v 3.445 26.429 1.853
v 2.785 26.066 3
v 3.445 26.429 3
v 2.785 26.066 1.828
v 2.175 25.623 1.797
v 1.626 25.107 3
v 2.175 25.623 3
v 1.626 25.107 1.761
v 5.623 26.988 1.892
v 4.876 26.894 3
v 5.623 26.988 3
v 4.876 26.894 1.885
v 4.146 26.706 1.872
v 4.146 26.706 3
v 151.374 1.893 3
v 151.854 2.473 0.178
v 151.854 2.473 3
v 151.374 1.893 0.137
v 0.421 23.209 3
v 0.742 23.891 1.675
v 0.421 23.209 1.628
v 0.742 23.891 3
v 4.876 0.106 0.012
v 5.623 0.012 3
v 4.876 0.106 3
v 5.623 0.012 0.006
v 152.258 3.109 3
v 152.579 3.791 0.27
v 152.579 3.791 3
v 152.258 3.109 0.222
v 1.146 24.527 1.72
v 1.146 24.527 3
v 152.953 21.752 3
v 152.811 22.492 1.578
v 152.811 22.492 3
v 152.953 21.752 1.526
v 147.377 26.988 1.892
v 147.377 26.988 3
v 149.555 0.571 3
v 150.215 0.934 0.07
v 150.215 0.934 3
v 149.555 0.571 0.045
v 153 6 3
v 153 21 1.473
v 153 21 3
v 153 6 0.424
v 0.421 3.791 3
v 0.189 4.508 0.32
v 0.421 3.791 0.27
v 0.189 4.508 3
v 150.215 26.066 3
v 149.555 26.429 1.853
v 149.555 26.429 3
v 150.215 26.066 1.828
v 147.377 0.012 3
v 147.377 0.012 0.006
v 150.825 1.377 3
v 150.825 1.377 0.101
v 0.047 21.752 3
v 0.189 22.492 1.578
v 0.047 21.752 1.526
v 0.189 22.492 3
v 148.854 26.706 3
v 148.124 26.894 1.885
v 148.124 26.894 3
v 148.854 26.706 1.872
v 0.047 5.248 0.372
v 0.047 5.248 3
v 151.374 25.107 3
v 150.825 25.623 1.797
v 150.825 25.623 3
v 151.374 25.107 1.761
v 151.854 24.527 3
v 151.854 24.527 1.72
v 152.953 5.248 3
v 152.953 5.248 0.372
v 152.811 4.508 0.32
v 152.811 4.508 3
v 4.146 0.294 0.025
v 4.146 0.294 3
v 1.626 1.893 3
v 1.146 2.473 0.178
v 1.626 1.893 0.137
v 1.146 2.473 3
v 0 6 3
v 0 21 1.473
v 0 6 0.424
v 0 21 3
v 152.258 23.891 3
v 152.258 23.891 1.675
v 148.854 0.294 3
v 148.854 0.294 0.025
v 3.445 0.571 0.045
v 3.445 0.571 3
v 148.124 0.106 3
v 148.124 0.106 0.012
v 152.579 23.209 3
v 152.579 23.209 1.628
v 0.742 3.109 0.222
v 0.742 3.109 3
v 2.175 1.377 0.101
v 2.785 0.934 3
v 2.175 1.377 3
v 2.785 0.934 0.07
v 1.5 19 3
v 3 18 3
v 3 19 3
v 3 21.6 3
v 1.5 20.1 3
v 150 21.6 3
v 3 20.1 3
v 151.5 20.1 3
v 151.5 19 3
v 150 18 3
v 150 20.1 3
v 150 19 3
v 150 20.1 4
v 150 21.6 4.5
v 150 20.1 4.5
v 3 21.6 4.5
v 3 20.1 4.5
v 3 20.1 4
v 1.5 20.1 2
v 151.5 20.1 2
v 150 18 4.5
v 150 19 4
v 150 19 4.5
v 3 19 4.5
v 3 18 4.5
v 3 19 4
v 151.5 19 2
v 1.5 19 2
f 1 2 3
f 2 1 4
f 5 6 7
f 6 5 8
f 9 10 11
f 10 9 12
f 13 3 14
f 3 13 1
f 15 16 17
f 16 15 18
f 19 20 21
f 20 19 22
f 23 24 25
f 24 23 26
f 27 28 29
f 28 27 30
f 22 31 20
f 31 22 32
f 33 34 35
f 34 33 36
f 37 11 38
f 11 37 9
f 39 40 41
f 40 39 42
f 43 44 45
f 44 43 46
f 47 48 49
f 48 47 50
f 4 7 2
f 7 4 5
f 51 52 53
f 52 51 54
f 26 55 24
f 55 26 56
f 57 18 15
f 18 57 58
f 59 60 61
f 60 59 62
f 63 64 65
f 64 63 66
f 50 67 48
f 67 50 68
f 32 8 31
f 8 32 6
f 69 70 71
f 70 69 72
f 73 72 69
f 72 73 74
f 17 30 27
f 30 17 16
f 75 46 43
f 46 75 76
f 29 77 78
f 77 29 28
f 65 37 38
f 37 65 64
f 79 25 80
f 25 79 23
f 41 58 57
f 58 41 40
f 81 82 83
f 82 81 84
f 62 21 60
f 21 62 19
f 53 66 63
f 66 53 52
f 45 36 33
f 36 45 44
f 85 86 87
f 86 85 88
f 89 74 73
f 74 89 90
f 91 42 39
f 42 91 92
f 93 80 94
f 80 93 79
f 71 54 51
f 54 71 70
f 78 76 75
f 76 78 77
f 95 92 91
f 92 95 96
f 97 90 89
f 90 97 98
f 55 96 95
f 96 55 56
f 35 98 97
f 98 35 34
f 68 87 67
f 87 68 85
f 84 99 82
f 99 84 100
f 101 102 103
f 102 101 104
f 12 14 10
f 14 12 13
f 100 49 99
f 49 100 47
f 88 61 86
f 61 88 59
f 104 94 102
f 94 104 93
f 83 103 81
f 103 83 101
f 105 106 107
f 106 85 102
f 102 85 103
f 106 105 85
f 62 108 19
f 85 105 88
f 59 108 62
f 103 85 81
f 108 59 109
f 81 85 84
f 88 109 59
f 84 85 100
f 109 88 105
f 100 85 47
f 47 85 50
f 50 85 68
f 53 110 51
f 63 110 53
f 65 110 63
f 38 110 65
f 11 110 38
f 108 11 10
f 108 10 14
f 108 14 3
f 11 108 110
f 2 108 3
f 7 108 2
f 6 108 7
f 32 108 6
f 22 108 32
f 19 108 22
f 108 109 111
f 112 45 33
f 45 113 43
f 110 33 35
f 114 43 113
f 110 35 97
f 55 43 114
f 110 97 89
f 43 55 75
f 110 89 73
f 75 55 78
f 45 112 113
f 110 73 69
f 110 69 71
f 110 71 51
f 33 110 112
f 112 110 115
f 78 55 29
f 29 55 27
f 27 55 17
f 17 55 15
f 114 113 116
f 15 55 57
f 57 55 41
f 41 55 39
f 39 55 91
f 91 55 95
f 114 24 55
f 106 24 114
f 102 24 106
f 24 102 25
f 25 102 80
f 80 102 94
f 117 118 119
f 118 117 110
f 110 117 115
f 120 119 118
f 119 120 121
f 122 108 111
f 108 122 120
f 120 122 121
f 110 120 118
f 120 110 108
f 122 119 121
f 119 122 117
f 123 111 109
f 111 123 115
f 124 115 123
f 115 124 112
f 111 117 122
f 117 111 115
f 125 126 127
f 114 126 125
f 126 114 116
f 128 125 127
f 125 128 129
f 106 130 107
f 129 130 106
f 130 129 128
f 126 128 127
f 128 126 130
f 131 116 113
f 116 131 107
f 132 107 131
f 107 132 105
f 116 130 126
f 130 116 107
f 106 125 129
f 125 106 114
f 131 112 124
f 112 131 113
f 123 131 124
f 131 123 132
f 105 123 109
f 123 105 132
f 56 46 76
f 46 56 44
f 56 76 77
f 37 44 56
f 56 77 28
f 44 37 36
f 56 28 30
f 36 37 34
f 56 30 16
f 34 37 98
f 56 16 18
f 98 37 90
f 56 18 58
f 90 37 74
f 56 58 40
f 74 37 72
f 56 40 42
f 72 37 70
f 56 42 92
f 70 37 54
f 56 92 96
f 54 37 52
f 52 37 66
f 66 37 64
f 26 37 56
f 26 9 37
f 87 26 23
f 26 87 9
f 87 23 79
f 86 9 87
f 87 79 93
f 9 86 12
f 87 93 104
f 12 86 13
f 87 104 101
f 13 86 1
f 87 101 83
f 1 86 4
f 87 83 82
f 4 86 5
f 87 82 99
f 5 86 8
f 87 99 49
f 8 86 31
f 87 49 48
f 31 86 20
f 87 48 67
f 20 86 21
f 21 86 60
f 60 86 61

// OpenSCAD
//
// ktStationery1
//
//


gap1 = 0.001;
gap2 = 0.002;

th = 2;


A();
//B();



module A(){
difference()
{
    union()
    {
        translate([6, 6, 0]) 
        minkowski()
        {
          cube([147-6, 21-6, th]);
          cylinder(r=6, h=1, $fn=50);
        }
        translate([3, 19+1.1, 3]) cube([147, 1.5, 1.5]);
        translate([3, 19-1, 3]) cube([147, 1, 1.5]);
    }
    
    translate([1.5, 19, 2]) cube([150, 1.1, 2]);
    
    translate([0, 0, -th]) rotate([4, 0, 0]) cube([200, 100, th]);
}
}



module B(){
difference()
{
    union()
    {
        translate([6, 6, 0]) 
        minkowski()
        {
          cube([147-6, 21-6, th]);
          cylinder(r=6, h=1, $fn=50);
        }
        translate([3, 18+1.1, 3]) cube([147, 1.5, 1.5]);
        translate([3, 18-1, 3]) cube([147, 1, 1.5]);
    }
    
    translate([1.5, 18, 2]) cube([150, 1.1, 2]);
    
    translate([0, 0, -th]) rotate([4, 0, 0]) cube([200, 100, th]);
}
}
